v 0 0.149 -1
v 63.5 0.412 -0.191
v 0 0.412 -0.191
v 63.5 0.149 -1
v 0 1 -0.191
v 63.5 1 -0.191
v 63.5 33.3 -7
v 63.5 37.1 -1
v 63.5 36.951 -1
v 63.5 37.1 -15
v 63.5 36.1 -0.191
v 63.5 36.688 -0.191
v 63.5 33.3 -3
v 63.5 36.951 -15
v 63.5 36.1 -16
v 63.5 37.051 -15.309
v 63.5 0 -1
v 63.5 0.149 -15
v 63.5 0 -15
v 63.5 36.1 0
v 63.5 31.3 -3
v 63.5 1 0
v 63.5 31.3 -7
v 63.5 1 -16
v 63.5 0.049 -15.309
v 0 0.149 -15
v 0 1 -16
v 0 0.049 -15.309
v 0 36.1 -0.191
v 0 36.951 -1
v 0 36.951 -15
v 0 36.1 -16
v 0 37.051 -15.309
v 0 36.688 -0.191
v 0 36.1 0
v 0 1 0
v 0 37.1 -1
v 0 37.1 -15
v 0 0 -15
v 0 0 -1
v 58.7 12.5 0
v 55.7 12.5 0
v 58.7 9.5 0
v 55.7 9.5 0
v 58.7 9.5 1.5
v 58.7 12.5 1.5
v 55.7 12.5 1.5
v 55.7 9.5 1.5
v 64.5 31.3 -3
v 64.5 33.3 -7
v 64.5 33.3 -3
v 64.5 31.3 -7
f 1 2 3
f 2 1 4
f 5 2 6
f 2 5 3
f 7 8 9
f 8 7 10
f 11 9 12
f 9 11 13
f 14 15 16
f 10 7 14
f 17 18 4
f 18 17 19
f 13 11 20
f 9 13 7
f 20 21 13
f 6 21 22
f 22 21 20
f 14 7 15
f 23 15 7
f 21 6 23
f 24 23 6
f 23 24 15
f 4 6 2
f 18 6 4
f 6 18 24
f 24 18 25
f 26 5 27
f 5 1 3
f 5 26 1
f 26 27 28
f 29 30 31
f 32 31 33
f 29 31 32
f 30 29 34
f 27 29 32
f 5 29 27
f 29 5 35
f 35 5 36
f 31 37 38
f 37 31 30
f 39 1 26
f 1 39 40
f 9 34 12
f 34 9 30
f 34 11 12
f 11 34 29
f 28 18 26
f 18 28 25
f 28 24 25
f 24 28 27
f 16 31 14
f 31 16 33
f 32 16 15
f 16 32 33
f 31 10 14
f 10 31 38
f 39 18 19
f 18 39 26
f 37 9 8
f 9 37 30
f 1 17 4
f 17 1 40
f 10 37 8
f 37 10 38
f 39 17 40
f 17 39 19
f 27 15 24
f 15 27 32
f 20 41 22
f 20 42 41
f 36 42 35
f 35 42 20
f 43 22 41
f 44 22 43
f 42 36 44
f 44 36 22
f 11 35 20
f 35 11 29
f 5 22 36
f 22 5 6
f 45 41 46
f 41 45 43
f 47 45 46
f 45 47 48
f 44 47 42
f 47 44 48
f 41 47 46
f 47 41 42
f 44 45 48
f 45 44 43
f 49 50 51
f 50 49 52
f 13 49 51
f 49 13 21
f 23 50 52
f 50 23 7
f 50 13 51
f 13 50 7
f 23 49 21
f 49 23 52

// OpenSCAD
echo(version=version());
// Switched 3 AAA Battery Box
use <MCAD/boxes.scad>

function switched_AAA_dims() = [63.5, 37.1, 16];

module switched_AAA_box() {
	box=[16, 37.1, 63.5];
	rotate([0, 90, 0]) {
		translate(box/2) {
			roundedBox(box, 1, true);
		}
	}
	translate([55.7, 9.5, 0]) {
		cube(size=[3, 3, 1.5]);
	}
	translate([63.5, 31.3, -7]) {
		cube(size=[1, 2, 4]);
	}
}

module switched_AAA_box_clip(width=10, thickness=2) {
	difference() {
		cube([width, 37.1 + thickness*2, 16+thickness]);
		translate([-1, thickness, 16]) {
			switched_AAA_box();
		}
	}
}

switched_AAA_box();
// switched_AAA_box_clip();
